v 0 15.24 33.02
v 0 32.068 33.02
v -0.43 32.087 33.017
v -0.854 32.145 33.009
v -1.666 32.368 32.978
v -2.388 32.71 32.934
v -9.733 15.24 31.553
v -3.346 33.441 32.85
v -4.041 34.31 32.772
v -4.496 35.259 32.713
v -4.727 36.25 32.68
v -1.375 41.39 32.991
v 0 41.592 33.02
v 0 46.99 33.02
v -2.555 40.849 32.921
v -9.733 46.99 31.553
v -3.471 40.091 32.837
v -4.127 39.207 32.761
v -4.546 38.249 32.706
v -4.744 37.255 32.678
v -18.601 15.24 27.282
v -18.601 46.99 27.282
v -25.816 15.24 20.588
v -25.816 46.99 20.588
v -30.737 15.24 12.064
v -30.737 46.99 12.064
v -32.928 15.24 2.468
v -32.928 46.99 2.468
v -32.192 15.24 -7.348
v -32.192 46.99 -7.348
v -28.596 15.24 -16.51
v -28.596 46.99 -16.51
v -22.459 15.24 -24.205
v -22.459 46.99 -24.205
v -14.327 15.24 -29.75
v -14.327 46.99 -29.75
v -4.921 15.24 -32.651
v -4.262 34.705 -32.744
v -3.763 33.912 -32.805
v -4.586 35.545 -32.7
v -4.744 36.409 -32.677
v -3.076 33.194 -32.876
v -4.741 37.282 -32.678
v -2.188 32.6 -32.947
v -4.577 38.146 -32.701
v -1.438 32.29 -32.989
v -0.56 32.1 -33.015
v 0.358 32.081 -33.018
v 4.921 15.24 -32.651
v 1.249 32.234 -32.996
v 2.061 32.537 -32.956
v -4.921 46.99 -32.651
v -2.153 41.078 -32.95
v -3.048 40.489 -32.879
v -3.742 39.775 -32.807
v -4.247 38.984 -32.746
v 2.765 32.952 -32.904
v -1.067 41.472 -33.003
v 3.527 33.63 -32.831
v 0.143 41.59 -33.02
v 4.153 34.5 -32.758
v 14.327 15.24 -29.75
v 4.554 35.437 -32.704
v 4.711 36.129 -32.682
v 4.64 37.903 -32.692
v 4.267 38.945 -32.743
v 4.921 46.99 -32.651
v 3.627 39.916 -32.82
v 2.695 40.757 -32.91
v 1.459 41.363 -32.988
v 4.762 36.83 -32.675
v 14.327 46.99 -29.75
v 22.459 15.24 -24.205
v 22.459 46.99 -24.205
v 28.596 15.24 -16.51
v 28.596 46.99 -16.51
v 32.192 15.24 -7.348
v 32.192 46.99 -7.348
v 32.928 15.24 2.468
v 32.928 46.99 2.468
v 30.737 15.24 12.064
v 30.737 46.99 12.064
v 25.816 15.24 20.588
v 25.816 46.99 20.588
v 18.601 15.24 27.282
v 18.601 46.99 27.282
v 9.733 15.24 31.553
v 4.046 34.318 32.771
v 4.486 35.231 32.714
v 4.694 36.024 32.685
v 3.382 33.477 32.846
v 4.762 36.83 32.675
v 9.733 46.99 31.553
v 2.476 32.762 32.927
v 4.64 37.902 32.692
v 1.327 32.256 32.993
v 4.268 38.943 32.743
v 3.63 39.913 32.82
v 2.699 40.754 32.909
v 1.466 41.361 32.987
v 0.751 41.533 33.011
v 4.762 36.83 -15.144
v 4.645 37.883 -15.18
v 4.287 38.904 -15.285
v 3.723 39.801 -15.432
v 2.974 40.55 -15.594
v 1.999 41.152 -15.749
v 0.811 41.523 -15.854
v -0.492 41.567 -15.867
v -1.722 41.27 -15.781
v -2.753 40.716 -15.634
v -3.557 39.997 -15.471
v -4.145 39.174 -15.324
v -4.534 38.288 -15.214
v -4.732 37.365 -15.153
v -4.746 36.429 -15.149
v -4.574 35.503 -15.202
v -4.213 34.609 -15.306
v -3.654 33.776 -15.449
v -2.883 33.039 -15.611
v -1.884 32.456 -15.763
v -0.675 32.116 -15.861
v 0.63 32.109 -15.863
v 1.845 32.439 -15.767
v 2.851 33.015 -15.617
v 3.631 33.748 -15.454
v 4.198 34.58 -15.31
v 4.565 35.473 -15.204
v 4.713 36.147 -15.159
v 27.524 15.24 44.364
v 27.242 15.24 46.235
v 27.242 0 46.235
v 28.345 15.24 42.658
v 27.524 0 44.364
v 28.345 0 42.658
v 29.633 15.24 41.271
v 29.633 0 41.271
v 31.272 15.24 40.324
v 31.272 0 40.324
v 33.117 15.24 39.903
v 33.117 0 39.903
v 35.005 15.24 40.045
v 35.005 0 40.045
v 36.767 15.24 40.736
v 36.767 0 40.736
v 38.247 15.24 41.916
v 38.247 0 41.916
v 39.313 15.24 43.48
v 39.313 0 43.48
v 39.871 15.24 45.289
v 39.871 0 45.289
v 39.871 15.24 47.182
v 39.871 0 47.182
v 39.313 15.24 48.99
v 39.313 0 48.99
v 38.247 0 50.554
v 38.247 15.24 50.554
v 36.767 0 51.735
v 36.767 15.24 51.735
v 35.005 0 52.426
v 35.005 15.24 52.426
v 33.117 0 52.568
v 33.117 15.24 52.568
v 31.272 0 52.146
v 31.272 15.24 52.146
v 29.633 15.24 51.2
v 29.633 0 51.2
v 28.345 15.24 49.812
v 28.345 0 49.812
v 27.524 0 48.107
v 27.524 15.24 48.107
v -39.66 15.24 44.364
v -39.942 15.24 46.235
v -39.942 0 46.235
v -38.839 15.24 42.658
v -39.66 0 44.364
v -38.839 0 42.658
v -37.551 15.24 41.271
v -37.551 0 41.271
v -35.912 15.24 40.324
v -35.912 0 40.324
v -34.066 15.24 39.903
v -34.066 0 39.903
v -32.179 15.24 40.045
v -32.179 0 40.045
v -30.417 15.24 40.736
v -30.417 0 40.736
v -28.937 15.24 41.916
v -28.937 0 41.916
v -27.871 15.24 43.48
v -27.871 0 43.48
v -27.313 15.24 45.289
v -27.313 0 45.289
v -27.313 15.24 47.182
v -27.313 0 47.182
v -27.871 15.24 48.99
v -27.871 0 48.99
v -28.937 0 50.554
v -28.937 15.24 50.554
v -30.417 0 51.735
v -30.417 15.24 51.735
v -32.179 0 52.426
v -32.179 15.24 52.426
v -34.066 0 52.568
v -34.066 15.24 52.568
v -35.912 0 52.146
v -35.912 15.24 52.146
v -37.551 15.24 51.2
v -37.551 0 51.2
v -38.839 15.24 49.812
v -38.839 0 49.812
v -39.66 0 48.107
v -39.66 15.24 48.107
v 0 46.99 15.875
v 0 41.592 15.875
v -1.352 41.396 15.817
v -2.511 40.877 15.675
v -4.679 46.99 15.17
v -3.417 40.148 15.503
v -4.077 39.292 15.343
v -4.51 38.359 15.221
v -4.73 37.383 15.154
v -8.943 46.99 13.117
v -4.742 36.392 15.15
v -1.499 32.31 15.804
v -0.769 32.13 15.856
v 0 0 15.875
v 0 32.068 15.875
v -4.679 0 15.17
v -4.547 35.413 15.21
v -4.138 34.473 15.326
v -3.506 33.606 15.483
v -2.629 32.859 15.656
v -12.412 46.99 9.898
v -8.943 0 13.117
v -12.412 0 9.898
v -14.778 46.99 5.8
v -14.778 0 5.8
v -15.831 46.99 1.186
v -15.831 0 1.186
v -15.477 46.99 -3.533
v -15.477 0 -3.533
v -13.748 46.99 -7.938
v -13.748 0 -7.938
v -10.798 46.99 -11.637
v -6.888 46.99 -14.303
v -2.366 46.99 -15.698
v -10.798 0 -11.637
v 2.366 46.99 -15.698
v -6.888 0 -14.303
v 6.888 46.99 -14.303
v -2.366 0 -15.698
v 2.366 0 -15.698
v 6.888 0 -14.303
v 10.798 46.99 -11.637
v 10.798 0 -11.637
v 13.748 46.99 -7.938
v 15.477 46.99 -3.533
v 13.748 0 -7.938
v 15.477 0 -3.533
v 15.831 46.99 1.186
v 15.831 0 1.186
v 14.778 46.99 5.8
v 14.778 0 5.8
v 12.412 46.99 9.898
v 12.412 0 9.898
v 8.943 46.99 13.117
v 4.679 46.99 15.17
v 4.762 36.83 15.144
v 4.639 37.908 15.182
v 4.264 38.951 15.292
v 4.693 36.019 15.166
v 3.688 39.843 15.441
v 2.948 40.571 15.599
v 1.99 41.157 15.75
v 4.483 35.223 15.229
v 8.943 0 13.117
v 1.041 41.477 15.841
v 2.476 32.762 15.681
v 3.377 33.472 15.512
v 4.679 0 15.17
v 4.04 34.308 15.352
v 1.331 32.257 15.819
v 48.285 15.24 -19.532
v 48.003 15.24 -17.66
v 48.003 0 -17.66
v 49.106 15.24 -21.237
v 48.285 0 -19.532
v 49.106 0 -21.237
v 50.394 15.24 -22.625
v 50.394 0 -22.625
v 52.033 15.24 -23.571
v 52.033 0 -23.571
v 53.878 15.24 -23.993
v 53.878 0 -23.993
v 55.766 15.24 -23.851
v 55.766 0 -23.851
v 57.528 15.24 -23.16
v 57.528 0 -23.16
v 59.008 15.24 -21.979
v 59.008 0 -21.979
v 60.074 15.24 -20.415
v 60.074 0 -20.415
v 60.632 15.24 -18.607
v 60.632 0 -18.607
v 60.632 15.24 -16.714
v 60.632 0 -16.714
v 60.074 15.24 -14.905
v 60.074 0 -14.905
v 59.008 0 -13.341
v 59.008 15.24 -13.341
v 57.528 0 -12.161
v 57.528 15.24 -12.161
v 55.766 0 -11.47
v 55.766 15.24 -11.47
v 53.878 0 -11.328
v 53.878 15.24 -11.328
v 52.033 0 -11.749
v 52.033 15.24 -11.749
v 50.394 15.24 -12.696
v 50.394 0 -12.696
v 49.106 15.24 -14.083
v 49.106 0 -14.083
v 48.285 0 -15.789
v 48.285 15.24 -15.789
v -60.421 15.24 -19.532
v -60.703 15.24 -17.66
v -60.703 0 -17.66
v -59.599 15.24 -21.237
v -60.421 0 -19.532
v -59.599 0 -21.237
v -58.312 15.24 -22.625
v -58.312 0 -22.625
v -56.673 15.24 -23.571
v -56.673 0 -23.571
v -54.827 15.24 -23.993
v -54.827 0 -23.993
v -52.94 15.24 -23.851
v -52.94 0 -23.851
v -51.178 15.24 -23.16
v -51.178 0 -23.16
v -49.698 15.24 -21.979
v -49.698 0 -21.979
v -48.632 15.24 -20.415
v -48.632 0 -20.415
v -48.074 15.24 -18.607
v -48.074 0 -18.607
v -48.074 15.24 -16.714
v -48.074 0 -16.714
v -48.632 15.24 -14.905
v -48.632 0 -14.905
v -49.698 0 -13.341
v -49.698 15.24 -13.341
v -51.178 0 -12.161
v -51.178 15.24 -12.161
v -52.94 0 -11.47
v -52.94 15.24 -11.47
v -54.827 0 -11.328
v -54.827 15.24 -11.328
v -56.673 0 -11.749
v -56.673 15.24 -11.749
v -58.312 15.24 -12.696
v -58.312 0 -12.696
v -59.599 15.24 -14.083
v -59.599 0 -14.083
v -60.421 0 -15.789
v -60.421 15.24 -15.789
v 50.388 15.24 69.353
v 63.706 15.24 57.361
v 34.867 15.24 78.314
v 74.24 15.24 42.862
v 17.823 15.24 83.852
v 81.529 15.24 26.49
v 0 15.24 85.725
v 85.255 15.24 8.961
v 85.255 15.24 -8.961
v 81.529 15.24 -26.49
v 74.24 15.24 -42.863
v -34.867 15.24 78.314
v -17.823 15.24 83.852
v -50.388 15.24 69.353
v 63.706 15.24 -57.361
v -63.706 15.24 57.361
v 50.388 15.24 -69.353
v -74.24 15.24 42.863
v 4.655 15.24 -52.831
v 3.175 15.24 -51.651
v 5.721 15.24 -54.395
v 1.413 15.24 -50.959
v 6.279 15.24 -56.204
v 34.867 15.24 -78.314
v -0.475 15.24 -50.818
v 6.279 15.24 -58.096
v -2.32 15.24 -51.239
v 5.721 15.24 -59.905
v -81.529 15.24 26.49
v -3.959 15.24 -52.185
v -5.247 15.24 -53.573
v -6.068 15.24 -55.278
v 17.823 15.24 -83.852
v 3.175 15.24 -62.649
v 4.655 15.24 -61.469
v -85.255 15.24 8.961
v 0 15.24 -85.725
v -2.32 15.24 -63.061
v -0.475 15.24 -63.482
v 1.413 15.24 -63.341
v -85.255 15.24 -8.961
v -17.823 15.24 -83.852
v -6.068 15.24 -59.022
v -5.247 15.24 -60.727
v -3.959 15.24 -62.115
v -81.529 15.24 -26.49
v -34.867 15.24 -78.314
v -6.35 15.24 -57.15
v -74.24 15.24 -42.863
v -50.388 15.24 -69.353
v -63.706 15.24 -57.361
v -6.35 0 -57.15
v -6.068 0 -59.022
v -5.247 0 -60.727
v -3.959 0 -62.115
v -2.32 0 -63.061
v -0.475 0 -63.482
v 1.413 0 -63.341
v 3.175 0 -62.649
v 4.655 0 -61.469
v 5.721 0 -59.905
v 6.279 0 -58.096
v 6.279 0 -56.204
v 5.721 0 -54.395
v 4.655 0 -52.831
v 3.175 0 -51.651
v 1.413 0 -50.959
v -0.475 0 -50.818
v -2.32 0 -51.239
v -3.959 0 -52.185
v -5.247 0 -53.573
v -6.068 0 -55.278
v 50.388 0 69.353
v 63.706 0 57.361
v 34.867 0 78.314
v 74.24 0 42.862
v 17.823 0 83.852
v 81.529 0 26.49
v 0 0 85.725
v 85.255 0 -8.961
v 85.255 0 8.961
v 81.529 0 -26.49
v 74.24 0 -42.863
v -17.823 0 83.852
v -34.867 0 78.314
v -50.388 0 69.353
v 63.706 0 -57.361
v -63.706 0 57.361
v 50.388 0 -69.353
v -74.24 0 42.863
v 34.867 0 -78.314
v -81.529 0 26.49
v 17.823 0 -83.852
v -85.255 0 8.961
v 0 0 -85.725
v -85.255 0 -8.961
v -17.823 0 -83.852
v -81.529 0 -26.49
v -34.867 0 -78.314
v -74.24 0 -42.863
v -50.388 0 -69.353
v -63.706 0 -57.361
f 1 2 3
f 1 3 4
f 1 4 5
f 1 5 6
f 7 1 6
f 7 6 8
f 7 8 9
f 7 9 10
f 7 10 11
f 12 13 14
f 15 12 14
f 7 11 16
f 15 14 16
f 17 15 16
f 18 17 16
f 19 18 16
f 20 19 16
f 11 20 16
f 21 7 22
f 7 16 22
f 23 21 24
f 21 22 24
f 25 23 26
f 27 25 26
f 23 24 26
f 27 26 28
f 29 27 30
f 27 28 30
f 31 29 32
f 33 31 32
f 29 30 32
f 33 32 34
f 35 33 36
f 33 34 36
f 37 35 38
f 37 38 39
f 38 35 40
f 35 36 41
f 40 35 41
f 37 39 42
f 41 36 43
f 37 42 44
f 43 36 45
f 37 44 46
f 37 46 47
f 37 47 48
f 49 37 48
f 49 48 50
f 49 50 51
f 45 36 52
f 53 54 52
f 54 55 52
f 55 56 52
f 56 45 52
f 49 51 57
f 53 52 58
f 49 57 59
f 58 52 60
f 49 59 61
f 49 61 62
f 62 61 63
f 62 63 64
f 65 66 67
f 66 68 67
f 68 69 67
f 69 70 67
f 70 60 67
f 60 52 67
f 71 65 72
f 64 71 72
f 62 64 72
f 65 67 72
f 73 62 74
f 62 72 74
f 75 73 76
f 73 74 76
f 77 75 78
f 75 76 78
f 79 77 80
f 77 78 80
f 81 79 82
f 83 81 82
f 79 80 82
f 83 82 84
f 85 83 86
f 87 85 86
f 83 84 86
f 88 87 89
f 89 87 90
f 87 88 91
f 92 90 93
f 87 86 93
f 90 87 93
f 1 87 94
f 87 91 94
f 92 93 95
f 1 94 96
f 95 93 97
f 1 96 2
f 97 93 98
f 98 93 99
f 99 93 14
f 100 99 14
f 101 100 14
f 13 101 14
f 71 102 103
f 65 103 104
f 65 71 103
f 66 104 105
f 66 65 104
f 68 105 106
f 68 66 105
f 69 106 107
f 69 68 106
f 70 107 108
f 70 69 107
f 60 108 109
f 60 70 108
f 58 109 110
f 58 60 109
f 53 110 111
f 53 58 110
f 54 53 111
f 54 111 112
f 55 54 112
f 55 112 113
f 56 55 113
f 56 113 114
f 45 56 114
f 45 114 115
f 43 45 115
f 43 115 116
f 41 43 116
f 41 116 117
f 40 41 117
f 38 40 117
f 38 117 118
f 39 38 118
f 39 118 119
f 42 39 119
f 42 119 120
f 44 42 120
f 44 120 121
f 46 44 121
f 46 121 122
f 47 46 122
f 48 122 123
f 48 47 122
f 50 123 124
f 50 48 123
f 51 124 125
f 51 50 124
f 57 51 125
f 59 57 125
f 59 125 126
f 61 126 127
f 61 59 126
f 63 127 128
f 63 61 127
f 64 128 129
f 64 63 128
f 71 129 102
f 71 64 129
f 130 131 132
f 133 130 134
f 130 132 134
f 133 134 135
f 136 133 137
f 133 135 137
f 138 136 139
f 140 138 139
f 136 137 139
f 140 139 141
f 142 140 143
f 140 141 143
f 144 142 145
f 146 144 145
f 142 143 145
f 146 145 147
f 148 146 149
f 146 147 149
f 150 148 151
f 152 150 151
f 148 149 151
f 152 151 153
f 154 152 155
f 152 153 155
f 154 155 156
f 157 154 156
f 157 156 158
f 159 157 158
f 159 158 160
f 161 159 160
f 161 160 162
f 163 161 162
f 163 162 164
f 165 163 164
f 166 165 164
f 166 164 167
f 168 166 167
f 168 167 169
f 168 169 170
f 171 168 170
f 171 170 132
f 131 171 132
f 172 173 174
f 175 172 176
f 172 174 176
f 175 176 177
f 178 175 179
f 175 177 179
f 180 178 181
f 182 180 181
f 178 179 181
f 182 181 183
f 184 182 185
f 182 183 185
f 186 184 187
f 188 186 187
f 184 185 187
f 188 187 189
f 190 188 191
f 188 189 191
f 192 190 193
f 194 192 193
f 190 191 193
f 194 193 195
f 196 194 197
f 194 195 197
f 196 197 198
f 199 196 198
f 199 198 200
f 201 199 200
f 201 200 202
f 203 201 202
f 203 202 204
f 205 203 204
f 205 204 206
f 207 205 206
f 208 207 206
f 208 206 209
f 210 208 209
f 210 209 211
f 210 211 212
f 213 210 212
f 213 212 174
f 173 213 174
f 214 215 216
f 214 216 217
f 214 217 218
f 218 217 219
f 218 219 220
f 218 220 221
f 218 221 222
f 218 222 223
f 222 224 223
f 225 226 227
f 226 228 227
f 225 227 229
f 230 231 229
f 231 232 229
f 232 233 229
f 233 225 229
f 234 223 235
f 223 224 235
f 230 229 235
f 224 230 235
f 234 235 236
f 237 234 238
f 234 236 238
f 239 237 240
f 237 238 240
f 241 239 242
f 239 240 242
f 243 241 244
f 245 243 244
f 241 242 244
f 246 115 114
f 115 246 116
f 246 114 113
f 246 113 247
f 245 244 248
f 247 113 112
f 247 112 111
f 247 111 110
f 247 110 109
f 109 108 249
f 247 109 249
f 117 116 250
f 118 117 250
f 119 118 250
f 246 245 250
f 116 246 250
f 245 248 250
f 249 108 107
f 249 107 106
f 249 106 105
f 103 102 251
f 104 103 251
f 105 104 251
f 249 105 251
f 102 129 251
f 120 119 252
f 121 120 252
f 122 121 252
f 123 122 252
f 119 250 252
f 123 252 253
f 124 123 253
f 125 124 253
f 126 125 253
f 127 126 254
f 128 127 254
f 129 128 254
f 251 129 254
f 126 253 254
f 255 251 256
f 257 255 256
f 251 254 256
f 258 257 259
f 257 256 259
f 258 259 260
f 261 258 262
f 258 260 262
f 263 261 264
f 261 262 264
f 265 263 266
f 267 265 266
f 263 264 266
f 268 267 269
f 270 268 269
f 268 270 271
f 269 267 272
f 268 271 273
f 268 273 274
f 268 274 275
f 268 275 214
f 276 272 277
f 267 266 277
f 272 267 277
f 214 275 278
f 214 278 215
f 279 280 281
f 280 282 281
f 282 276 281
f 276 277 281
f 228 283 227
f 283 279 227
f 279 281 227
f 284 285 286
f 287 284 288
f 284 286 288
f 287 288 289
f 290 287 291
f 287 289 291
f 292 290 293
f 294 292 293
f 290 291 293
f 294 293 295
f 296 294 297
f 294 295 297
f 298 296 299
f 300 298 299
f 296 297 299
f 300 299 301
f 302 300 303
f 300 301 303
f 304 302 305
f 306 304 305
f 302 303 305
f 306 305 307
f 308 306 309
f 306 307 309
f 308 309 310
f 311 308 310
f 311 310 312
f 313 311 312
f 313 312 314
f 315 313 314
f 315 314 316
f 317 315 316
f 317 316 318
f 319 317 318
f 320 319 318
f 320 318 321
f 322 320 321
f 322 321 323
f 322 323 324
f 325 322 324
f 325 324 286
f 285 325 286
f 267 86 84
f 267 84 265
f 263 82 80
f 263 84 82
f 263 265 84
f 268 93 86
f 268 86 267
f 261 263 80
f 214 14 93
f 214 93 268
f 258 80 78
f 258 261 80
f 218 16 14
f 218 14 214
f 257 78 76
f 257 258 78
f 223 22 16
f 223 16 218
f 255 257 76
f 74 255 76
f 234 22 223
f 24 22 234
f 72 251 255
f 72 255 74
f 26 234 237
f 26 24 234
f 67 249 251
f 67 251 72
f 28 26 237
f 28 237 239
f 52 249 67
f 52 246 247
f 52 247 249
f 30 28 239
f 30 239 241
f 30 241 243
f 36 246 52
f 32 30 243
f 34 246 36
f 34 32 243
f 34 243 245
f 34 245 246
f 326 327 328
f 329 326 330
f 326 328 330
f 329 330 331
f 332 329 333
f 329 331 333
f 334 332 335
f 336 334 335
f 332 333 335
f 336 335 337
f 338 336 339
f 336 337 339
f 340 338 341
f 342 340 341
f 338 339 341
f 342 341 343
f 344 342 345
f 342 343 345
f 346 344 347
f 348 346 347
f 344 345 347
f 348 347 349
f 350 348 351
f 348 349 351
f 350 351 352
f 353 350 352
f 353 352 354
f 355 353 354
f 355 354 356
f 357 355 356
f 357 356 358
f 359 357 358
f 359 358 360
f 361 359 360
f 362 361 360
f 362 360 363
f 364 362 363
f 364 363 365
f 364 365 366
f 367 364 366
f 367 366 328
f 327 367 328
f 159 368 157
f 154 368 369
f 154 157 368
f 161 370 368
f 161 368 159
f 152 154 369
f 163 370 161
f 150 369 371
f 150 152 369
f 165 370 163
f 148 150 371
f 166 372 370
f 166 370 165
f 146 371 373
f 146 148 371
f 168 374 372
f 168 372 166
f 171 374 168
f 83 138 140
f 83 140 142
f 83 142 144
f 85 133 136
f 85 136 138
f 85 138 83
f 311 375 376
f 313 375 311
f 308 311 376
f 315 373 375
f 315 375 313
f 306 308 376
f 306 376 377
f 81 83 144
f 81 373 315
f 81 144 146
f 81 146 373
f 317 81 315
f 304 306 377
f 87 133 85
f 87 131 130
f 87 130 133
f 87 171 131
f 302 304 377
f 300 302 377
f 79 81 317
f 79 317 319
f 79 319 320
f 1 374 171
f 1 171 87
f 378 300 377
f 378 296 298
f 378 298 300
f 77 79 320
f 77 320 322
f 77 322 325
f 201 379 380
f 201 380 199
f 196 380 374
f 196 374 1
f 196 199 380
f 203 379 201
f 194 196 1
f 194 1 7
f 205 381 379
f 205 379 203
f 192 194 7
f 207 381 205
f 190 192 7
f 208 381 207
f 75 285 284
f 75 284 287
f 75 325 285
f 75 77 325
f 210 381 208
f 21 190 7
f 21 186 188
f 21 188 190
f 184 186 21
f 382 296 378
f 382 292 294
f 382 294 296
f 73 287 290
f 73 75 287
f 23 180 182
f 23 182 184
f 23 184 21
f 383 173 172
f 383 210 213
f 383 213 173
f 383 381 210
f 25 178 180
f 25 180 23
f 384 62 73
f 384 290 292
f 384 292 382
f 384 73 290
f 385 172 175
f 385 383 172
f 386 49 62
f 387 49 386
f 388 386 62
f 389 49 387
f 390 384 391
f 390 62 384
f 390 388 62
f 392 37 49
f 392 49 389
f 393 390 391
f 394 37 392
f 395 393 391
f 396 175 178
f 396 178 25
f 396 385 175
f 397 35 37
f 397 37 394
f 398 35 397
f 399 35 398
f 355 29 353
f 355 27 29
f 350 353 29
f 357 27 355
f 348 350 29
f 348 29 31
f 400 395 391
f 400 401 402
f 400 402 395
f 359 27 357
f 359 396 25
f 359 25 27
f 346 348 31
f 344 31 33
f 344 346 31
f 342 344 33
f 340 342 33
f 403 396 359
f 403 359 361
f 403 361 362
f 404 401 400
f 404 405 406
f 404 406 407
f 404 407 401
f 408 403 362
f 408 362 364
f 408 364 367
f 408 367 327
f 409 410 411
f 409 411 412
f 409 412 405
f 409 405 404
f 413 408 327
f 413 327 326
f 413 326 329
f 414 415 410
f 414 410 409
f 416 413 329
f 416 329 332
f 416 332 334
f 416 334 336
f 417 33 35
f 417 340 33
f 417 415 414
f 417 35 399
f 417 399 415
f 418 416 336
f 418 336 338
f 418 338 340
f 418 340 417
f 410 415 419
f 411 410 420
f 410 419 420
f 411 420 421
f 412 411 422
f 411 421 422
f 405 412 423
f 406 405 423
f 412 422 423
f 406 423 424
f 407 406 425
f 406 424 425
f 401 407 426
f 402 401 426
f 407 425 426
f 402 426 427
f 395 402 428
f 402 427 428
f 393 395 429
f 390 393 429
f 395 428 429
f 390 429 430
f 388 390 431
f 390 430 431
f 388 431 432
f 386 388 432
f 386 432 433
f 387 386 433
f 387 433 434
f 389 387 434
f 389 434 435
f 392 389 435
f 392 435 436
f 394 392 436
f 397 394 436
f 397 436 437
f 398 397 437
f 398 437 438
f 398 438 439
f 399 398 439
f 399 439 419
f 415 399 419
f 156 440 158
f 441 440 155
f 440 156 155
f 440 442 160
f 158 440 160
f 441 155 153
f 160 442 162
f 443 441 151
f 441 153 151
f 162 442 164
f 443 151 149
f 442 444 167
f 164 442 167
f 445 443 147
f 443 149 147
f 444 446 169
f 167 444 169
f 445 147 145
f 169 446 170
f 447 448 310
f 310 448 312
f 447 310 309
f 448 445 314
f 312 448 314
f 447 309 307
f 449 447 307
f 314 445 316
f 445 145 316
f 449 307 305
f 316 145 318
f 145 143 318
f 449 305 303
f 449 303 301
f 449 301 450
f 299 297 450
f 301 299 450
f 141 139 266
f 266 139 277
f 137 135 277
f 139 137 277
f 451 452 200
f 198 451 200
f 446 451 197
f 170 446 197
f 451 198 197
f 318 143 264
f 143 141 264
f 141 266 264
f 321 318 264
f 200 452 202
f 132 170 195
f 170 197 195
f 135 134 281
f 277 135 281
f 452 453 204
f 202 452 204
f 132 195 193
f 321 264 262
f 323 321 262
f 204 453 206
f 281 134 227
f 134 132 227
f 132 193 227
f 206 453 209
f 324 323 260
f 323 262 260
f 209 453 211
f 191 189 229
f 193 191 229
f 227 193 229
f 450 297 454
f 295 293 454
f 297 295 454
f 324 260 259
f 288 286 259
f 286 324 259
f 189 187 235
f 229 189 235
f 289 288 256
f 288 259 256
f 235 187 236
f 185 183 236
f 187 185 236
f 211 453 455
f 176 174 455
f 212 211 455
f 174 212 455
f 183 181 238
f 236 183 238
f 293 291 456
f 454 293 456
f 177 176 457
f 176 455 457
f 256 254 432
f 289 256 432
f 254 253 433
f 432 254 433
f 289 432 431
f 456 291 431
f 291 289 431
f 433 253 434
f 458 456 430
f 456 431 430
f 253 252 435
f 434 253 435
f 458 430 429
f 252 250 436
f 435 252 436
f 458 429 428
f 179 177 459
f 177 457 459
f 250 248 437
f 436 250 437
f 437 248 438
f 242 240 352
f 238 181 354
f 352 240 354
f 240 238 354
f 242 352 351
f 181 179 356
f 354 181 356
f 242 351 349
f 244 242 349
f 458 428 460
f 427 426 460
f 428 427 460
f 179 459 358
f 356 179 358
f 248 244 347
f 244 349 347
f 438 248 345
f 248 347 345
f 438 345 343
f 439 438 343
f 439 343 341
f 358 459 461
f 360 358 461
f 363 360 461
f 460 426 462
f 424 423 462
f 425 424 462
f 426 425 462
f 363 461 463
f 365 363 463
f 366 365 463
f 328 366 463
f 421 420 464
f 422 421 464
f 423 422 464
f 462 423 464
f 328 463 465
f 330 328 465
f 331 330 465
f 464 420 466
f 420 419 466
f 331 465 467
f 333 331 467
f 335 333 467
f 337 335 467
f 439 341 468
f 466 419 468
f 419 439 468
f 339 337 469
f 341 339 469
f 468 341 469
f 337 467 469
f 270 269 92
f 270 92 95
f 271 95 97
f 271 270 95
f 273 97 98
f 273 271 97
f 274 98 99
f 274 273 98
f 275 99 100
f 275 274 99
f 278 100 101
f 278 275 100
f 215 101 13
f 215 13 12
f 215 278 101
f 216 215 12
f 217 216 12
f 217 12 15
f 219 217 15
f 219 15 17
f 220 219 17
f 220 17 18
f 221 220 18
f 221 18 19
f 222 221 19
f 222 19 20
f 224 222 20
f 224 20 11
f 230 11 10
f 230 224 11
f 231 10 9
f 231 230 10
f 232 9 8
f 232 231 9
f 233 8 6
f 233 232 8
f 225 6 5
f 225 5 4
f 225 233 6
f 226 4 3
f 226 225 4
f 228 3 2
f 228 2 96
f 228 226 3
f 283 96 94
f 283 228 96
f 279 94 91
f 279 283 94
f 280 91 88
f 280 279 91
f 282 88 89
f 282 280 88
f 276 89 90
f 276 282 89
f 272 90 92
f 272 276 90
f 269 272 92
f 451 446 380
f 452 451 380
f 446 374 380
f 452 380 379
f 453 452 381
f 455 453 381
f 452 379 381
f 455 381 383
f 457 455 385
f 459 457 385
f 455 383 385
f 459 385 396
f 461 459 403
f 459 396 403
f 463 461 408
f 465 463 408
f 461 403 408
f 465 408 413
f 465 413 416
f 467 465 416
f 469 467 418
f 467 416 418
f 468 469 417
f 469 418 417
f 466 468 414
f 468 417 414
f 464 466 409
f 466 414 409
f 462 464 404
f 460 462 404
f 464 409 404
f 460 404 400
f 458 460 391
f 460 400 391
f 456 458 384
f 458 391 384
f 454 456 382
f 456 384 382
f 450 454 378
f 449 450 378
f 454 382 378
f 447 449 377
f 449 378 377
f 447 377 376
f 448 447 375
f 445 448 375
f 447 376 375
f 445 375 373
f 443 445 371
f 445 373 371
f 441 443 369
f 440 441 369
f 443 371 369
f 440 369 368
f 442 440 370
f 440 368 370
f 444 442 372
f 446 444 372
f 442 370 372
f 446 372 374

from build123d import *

# Parameters (mm, degrees)
SKETCH1_W                  = 17.145
SKETCH1_H                  = 31.75
SKETCH1_W_2                = 69.85
SKETCH1_H_2                = 15.24
F_1_2_0_5_DIAMETER_HOLE1_D = 12.7
CUT_EXTRUDE1_DEPTH         = 131.021580324
CUT_EXTRUDE1_DEPTH_BACK    = 131.021580324
SKETCH10_R                 = 4.7625


with BuildPart() as part:
    # Sketch1 → Revolve1 (revolve)
    with BuildSketch(Plane.XY, mode=Mode.PRIVATE) as revolve1_sk:
        with Locations((24.4475, 31.115)):
            Rectangle(SKETCH1_W, SKETCH1_H)
        with Locations((50.8, 7.62)):
            Rectangle(SKETCH1_W_2, SKETCH1_H_2)
    revolve(revolve1_sk.sketch.rotate(Axis((0, 7.809475806, 0), (0, -1, 0)), 90), axis=Axis((0, 7.809475806, 0), (0, -1, 0)))

    # 1/2 (0.5) Diameter Hole1 (through all)
    with Locations(Plane(origin=(0, 15.24, 0), x_dir=(1, 0, 0), z_dir=(0, 1, 0))):
        with Locations((-54.352879906, 17.660321229), (0, 57.15), (54.352879906, 17.660321229), (33.591927169, -46.235321229), (-33.591927169, -46.235321229)):
            Hole(F_1_2_0_5_DIAMETER_HOLE1_D / 2)

    # Sketch10 → Cut-Extrude1 (cut, two sides: drawn at the far end of the back side and taken through both)
    with BuildSketch(Plane.XY.offset(-CUT_EXTRUDE1_DEPTH_BACK)):
        with Locations((0, 36.83)):
            Circle(SKETCH10_R)
    extrude(amount=CUT_EXTRUDE1_DEPTH + CUT_EXTRUDE1_DEPTH_BACK, mode=Mode.SUBTRACT)


solid = part.part
